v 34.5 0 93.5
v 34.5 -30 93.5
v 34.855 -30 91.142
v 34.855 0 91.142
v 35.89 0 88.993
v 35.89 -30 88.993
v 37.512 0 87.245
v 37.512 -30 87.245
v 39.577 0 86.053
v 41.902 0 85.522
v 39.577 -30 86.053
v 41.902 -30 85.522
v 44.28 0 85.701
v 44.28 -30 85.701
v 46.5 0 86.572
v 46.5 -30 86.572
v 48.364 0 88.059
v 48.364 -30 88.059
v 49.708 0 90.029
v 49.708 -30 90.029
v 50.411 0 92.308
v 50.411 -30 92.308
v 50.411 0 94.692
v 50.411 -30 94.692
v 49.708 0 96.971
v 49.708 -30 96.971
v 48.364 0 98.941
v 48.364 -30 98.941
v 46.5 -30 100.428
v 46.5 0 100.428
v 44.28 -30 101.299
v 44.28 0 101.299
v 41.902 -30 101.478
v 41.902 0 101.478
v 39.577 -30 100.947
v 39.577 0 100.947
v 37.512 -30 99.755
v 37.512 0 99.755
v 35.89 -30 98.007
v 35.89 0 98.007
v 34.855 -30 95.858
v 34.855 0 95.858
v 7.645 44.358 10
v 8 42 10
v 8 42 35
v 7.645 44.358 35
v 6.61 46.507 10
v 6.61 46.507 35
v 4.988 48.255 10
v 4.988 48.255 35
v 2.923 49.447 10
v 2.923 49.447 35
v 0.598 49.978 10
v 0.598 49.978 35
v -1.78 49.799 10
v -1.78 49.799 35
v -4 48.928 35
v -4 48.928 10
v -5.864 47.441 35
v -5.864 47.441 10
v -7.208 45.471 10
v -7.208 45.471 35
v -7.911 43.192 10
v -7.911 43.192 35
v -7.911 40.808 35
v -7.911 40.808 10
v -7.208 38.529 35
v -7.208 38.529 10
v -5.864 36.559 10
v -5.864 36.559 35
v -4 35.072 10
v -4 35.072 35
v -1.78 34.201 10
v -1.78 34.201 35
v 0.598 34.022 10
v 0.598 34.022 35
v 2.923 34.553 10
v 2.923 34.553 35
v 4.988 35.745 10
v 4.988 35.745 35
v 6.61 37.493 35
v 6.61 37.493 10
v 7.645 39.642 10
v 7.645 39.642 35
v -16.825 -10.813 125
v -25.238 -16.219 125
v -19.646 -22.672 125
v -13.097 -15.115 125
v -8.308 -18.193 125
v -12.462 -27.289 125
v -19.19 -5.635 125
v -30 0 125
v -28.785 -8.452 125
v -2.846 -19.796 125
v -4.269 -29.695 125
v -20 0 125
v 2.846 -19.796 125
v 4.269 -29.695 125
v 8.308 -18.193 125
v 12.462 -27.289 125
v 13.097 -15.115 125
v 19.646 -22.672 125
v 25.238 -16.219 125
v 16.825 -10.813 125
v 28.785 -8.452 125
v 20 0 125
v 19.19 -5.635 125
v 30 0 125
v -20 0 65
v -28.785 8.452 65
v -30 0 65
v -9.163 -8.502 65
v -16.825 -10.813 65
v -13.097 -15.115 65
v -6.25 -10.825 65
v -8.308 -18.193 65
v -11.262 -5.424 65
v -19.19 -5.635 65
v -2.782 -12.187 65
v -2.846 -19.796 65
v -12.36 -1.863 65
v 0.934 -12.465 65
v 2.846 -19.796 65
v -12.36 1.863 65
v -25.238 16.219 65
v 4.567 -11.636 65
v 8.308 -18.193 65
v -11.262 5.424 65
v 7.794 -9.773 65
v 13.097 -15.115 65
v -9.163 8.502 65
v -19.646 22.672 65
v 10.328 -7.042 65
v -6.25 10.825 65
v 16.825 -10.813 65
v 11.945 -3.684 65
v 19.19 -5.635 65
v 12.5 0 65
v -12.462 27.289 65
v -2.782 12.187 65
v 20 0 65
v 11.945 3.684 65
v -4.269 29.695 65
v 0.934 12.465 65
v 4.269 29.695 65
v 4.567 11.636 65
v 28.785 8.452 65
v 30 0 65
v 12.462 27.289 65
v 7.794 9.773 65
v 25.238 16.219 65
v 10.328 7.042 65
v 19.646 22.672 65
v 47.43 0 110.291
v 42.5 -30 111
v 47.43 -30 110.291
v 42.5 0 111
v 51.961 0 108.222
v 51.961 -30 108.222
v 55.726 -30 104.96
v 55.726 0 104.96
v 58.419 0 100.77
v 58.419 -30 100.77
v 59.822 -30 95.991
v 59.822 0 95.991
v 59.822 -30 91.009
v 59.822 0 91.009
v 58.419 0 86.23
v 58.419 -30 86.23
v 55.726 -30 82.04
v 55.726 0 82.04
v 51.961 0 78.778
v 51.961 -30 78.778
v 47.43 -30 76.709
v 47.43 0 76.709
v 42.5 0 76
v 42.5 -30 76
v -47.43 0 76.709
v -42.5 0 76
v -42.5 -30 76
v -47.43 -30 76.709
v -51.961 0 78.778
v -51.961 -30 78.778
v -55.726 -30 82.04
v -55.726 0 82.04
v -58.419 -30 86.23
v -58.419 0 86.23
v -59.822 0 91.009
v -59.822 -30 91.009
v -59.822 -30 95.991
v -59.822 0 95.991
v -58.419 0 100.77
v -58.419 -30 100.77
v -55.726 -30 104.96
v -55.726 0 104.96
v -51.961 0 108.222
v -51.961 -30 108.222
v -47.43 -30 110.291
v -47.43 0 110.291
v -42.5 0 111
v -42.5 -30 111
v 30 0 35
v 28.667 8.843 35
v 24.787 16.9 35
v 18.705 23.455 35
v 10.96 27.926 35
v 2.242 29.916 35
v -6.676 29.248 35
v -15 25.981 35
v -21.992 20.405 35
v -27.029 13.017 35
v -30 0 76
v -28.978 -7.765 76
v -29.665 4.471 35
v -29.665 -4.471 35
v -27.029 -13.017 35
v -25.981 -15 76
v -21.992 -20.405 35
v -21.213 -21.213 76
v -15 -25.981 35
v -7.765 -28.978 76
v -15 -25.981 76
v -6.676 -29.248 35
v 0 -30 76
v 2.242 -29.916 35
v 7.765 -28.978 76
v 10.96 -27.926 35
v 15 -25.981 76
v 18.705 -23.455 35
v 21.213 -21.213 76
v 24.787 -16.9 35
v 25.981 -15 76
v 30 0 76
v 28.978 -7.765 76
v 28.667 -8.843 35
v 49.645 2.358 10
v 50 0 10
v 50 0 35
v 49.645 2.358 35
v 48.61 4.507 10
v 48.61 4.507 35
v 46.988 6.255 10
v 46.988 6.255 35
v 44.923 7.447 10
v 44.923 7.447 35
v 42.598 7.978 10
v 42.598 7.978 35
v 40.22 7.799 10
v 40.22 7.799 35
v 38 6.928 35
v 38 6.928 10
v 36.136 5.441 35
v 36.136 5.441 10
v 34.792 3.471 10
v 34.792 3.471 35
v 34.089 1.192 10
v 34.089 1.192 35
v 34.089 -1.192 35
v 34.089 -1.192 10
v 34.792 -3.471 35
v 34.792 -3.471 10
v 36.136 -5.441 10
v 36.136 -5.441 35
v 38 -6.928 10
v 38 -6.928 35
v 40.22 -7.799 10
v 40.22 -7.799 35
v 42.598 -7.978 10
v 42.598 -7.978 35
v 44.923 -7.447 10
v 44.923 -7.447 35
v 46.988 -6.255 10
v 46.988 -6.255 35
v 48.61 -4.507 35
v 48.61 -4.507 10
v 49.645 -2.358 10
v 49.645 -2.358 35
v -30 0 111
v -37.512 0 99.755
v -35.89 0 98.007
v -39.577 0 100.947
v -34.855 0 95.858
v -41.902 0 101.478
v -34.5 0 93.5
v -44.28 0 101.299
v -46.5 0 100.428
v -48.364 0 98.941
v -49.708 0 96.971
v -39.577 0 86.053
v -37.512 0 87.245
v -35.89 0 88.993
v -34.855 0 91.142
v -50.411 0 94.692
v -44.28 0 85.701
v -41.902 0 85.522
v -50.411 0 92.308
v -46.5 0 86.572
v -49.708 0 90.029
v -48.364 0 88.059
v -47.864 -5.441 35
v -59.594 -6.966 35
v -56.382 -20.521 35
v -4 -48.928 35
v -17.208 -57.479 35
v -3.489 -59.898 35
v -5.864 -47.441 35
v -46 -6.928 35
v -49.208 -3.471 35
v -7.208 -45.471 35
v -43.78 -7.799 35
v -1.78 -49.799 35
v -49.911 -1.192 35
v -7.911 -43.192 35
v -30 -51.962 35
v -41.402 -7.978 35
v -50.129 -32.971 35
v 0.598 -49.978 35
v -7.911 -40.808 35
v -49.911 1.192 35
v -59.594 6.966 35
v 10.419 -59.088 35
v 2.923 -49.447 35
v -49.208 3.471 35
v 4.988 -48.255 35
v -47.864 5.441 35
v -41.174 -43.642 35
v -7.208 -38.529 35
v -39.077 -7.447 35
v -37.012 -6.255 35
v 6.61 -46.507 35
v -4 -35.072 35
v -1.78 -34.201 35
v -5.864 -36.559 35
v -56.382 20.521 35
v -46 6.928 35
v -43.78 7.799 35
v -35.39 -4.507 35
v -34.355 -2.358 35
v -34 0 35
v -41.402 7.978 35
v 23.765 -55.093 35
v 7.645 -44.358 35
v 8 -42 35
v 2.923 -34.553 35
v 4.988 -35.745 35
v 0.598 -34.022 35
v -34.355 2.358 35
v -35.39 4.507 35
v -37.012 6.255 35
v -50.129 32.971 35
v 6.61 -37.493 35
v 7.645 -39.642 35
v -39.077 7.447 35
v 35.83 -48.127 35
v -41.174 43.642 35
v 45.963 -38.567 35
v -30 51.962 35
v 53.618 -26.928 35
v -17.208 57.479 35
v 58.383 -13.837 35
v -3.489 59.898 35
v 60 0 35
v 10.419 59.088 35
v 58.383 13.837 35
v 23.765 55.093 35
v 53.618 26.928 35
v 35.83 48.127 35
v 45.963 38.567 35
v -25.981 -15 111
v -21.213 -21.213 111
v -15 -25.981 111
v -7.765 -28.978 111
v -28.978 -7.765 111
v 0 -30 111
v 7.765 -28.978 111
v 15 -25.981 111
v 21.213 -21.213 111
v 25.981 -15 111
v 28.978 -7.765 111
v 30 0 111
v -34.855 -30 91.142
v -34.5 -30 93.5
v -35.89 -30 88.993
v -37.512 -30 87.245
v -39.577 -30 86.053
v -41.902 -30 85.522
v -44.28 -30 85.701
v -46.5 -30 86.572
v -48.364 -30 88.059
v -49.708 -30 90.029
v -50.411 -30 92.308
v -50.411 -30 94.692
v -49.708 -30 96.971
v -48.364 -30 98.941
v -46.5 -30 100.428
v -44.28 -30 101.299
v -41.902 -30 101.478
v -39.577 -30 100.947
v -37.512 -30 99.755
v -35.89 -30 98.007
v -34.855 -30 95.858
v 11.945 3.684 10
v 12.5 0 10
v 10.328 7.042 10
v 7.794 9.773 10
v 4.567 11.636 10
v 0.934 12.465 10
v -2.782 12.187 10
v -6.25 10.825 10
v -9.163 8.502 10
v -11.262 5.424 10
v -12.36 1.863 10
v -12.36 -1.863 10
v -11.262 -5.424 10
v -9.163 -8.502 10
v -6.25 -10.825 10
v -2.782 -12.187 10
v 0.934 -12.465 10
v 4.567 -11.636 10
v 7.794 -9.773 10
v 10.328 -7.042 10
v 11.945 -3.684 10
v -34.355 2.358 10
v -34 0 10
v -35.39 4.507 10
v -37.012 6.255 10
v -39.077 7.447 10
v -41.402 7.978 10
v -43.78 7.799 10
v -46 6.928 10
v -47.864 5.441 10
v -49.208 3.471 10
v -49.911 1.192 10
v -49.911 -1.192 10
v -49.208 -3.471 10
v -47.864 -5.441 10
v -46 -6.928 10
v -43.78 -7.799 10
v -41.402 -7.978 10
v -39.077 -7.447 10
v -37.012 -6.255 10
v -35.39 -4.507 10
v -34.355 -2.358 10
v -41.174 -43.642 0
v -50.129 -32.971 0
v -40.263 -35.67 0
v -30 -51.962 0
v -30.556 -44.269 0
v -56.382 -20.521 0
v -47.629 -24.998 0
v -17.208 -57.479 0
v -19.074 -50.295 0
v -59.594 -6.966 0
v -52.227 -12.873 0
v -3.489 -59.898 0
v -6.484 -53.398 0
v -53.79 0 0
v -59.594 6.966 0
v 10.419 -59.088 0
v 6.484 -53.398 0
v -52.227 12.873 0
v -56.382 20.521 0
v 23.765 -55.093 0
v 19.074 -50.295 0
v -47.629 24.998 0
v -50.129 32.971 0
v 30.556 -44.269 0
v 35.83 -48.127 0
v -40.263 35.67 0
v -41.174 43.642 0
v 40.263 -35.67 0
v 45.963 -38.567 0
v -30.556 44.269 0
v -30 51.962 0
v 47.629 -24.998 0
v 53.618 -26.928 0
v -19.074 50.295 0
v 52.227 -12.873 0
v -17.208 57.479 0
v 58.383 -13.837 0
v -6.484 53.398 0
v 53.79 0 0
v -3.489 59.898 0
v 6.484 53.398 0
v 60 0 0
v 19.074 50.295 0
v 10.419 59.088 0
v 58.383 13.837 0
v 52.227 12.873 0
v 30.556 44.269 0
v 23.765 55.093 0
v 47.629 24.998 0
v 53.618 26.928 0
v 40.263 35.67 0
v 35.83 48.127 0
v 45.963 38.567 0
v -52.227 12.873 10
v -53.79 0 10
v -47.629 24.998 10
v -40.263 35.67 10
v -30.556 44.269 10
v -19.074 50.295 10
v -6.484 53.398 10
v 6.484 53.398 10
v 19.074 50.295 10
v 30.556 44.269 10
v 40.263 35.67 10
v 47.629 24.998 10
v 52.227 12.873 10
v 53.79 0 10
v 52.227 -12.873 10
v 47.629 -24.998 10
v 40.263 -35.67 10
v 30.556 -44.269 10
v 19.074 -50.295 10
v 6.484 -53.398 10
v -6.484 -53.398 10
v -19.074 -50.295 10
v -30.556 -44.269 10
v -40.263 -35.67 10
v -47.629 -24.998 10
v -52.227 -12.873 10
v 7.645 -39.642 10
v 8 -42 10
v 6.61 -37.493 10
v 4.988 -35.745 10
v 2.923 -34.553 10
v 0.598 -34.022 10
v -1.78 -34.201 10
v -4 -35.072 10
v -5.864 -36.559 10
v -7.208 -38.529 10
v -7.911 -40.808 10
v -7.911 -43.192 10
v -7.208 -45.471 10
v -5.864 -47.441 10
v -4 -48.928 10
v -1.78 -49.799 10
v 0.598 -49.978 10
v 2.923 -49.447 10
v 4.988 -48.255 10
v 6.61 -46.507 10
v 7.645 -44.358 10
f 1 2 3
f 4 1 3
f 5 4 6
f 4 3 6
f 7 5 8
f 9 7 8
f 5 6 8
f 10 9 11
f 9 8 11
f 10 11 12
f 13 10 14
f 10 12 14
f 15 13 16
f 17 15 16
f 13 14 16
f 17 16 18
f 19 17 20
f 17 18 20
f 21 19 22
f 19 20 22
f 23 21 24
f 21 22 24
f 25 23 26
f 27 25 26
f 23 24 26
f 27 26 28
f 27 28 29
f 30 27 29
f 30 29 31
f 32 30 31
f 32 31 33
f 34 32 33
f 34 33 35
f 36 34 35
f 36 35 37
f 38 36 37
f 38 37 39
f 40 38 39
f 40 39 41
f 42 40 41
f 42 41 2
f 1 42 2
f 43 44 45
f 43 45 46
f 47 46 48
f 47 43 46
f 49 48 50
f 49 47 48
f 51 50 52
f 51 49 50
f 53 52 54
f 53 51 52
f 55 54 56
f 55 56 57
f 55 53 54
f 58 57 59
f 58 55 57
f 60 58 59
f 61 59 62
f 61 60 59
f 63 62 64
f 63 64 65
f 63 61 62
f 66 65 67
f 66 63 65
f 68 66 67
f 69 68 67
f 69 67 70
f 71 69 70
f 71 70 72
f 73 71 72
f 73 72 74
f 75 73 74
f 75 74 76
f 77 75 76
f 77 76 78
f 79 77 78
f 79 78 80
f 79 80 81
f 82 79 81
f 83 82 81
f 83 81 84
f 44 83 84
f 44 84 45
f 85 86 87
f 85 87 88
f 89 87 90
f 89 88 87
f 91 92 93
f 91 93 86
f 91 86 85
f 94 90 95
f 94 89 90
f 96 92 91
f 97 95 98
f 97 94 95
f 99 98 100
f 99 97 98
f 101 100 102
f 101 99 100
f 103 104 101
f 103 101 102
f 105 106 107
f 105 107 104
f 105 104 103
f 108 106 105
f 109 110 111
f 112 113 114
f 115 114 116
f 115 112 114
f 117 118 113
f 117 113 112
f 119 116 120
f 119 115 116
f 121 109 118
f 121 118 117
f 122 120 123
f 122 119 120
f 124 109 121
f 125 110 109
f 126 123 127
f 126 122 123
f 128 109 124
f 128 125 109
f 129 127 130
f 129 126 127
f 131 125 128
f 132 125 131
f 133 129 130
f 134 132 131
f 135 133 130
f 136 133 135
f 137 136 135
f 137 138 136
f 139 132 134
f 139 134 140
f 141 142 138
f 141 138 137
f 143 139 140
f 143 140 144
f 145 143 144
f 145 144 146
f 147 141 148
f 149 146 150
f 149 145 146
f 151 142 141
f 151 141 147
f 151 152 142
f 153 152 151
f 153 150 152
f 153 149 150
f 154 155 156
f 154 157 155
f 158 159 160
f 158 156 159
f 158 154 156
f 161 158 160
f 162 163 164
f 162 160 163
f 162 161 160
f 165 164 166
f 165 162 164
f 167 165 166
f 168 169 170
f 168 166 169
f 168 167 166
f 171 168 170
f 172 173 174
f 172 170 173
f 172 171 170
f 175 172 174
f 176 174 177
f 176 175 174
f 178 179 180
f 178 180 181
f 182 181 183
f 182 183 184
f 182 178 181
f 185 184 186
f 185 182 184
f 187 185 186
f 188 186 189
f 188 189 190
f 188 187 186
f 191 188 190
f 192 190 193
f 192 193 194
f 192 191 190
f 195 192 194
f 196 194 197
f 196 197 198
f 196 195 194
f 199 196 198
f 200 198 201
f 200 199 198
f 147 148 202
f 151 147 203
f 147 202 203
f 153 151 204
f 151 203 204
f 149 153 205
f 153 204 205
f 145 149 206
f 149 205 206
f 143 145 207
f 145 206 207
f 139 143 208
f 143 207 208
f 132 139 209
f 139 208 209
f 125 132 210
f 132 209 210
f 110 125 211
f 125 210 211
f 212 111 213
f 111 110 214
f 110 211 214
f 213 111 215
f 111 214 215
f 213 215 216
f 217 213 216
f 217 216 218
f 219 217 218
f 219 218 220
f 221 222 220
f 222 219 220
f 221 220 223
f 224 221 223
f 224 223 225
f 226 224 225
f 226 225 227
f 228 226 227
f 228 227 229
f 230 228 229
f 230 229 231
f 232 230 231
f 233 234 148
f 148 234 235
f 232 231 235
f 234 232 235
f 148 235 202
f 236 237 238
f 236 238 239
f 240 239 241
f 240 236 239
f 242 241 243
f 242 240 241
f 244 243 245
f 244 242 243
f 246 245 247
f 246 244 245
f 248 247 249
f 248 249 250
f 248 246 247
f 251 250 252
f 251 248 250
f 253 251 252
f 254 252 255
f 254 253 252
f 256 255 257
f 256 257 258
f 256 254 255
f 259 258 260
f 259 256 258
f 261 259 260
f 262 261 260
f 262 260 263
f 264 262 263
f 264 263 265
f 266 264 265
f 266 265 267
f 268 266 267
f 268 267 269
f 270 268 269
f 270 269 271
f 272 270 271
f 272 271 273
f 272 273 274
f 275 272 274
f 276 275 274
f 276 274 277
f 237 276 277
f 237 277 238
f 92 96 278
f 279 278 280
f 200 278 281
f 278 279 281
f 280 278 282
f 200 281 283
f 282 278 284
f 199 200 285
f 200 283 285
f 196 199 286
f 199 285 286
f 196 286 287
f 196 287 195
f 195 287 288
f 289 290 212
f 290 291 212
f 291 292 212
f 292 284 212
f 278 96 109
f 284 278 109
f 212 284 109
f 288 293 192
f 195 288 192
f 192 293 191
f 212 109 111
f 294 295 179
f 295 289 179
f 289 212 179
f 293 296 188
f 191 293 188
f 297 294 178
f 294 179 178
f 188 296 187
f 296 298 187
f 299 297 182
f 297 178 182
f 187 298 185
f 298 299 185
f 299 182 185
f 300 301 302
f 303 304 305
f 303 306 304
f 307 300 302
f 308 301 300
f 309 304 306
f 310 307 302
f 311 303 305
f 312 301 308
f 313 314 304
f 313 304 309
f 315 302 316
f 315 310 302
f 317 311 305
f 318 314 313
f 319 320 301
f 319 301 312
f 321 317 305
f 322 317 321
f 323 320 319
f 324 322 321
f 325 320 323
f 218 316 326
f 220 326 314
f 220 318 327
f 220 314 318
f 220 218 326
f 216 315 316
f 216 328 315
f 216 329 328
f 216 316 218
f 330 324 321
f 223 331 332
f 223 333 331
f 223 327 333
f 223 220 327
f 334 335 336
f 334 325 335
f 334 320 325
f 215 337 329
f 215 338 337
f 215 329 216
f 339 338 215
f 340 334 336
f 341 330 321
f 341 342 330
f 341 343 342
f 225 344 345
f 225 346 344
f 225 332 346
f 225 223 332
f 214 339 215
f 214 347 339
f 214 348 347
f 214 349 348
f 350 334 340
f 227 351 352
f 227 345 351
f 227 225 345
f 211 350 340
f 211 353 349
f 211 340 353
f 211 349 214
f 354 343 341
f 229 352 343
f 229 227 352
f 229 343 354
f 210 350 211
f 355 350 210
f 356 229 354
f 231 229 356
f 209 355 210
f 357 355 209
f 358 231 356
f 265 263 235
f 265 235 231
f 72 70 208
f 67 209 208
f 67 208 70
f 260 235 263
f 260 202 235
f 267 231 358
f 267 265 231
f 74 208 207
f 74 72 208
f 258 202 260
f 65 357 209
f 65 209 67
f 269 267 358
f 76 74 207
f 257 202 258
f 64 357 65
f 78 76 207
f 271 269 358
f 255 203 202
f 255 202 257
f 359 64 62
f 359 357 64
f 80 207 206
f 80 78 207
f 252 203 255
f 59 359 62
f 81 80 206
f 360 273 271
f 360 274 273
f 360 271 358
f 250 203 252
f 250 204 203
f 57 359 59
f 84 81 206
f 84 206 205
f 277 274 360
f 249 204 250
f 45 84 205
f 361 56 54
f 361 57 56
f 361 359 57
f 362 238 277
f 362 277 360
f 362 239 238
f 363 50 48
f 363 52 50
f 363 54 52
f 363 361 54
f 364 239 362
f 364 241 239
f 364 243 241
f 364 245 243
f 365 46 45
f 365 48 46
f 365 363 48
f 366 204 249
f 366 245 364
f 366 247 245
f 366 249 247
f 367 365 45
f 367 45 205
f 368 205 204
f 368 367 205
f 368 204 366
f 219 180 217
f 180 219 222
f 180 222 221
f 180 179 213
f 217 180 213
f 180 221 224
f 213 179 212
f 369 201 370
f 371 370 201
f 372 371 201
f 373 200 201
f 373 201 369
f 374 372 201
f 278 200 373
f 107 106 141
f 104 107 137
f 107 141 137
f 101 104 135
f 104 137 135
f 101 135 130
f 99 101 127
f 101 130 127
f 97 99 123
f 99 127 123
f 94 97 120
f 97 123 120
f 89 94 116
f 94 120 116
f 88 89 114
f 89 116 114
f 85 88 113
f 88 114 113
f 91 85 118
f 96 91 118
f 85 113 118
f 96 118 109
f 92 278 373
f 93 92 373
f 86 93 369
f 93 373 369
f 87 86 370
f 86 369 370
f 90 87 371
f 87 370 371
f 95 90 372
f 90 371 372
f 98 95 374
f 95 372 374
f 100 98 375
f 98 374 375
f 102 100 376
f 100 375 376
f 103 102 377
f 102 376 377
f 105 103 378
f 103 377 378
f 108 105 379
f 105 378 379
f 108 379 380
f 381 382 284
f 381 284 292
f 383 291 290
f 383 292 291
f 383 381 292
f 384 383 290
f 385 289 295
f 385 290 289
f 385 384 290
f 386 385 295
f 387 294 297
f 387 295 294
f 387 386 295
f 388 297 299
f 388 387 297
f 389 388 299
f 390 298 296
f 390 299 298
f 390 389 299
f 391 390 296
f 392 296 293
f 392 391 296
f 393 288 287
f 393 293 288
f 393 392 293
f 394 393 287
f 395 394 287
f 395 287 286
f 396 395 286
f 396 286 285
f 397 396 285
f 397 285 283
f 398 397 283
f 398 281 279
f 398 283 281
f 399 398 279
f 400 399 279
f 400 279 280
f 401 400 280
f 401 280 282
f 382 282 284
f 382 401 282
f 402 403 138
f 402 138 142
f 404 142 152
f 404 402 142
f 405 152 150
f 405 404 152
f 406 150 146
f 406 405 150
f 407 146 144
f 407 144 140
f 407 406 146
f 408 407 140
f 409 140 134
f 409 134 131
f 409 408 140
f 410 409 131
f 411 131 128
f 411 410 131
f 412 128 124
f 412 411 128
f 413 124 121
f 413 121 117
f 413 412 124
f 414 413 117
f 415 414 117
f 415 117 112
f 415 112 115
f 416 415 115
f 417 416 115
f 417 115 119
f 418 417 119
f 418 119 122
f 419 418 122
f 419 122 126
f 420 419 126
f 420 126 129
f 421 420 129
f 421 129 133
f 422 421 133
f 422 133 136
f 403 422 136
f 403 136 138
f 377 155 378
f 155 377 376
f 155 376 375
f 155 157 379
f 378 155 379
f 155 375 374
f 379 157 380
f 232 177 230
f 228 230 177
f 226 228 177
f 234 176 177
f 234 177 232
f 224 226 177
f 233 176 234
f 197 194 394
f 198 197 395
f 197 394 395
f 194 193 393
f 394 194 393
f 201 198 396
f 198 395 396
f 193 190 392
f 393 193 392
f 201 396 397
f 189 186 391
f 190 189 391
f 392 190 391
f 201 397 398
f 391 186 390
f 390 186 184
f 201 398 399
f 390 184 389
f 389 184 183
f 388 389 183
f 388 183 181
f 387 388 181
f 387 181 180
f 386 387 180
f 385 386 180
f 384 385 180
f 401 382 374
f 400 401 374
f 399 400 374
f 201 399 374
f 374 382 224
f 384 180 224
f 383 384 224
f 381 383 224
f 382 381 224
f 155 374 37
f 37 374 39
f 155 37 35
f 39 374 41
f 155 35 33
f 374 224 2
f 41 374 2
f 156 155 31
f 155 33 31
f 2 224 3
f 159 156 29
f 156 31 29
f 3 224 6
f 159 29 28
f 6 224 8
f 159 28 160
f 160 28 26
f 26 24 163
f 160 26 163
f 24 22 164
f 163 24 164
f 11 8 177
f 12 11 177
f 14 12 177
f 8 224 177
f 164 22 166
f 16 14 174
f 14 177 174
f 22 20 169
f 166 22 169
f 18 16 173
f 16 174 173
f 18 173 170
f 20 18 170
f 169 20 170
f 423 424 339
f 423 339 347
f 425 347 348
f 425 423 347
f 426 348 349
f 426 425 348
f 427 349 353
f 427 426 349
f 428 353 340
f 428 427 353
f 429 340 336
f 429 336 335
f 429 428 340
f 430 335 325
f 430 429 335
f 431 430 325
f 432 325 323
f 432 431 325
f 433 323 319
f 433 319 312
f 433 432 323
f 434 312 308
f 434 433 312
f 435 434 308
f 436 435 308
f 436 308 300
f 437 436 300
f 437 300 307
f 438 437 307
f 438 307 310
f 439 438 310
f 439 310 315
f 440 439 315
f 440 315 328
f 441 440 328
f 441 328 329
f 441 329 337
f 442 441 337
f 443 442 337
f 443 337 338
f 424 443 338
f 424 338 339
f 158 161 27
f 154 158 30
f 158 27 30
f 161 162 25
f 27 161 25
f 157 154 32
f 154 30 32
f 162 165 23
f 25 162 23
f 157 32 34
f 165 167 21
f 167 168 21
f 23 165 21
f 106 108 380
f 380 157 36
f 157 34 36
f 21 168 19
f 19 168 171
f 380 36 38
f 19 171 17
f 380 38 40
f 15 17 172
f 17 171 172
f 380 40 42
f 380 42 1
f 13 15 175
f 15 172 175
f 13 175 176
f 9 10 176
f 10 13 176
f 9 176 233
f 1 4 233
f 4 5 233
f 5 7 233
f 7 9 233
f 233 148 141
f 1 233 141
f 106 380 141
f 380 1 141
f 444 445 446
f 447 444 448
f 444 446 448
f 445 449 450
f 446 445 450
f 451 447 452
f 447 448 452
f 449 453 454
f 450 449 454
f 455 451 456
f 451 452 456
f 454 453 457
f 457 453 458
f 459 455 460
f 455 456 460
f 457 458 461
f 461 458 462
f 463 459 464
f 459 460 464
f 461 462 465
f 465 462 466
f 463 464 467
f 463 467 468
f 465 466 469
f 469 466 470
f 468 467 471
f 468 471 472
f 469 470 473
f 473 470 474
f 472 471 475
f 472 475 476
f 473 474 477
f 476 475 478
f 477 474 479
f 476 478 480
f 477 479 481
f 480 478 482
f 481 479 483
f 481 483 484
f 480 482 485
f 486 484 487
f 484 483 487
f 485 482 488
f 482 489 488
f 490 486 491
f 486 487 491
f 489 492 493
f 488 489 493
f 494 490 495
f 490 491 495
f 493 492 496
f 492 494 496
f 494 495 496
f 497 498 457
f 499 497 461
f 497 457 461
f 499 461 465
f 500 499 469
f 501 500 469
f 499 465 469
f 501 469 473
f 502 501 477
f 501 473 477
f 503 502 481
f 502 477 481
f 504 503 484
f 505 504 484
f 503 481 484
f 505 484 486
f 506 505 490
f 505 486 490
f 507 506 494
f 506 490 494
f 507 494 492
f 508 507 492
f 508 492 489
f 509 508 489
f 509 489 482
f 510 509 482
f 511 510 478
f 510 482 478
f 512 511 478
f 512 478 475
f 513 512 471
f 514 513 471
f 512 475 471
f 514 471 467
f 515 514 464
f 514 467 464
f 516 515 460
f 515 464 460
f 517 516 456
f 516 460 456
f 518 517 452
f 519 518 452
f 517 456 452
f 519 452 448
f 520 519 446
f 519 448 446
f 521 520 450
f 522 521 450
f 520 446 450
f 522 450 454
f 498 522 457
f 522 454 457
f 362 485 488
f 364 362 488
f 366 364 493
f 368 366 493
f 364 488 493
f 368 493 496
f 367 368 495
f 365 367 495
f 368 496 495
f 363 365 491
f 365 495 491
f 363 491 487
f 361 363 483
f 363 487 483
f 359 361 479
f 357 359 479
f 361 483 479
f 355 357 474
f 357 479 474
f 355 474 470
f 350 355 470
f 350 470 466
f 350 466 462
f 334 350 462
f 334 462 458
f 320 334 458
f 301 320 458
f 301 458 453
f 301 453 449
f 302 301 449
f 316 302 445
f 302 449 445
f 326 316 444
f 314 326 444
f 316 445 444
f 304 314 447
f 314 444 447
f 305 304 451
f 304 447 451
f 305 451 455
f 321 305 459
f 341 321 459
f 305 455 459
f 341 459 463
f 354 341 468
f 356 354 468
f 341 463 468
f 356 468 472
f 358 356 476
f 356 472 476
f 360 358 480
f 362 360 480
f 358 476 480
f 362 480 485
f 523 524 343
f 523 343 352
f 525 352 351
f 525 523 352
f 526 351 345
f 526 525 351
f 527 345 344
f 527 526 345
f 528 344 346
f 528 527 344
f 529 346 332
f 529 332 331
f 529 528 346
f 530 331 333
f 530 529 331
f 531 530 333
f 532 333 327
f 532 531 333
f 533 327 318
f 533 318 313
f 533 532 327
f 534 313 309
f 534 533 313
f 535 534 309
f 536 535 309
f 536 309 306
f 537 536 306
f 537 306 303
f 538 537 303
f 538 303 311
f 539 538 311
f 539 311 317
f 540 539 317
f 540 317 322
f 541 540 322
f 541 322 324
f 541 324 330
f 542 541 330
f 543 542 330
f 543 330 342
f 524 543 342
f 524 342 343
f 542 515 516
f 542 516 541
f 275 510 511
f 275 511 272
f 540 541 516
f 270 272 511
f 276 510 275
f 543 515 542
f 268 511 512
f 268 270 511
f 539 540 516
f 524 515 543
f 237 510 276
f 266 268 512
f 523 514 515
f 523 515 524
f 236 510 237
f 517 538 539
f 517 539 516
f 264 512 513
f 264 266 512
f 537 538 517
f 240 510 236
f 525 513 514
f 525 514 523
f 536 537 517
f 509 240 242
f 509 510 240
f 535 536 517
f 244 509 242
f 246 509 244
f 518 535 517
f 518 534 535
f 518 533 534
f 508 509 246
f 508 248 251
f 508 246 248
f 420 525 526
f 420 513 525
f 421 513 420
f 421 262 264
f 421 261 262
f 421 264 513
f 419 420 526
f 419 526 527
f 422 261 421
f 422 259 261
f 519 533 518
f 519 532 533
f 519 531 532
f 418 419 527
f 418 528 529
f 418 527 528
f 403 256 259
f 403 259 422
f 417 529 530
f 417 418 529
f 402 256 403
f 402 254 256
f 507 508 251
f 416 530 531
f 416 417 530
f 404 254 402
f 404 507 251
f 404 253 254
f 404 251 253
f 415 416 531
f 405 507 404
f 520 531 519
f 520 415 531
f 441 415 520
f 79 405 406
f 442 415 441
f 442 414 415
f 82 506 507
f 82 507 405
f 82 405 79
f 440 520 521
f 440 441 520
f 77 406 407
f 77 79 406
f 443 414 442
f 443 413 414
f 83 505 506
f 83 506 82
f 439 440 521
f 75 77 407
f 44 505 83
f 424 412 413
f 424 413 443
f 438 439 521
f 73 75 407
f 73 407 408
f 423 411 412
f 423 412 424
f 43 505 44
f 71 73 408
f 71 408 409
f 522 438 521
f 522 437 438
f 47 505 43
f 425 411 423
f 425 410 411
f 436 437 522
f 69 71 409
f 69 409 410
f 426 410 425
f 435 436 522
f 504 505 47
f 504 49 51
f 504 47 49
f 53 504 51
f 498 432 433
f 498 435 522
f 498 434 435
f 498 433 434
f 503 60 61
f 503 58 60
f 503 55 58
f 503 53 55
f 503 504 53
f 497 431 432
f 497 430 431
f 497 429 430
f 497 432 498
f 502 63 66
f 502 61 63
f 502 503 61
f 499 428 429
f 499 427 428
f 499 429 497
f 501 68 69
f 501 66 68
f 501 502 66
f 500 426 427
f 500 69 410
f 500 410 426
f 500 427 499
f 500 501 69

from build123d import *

# Parameters (mm, degrees)
BOSS_EXTRUDE1_DEPTH         = 125
SKETCH1_4_R                 = 12.5
BOSS_EXTRUDE2_DEPTH         = 65
SKETCH1_5_R                 = 60
SKETCH1_5_R_2               = 8
SKETCH1_5_R_3               = 30
BOSS_EXTRUDE3_DEPTH         = 35
BOSS_EXTRUDE4_START         = -49
BOSS_EXTRUDE4_DEPTH         = 35
FILLET1_RADIUS              = 17.5
FILLET1_LENGTH              = 30
F_16_0_16_DIAMETER_HOLE1_D  = 16
FILLET1_OF_MIRROR1_2_RADIUS = 17.5
FILLET1_OF_MIRROR1_2_LENGTH = 30
SKETCH5_R                   = 53.79037733
CUT_EXTRUDE2_DEPTH          = 10


with BuildPart() as part:
    # Sketch1 → Boss-Extrude1 (new body)
    with BuildSketch(Plane.XY):
        with BuildLine():
            Line((30, 0), (20, 0))
            ThreePointArc((20, 0), (0, -20), (-20, 0))
            Line((-20, 0), (-30, 0))
            ThreePointArc((-30, 0), (0, -30), (30, 0))
        make_face()
    extrude(amount=BOSS_EXTRUDE1_DEPTH)

    # Sketch1<4> → Boss-Extrude2 (add)
    with BuildSketch(Plane.XY):
        with BuildLine():
            ThreePointArc((-20, 0), (0, -20), (20, 0))
            Line((20, 0), (30, 0))
            ThreePointArc((30, 0), (0, 30), (-30, 0))
            Line((-30, 0), (-20, 0))
        make_face()
        Circle(SKETCH1_4_R, mode=Mode.SUBTRACT)
    extrude(amount=BOSS_EXTRUDE2_DEPTH)

    # Sketch1<5> → Boss-Extrude3 (add)
    with BuildSketch(Plane.XY):
        Circle(SKETCH1_5_R)
        with Locations((0, 42)):
            Circle(SKETCH1_5_R_2, mode=Mode.SUBTRACT)
        with Locations((-42, 0)):
            Circle(SKETCH1_5_R_2, mode=Mode.SUBTRACT)
        with Locations((0, -42)):
            Circle(SKETCH1_5_R_2, mode=Mode.SUBTRACT)
        with Locations((42, 0)):
            Circle(SKETCH1_5_R_2, mode=Mode.SUBTRACT)
        Circle(SKETCH1_5_R_3, mode=Mode.SUBTRACT)
    extrude(amount=BOSS_EXTRUDE3_DEPTH)

    # Sketch2 → Boss-Extrude4 (add)
    with BuildSketch(Plane.XY.offset(125).offset(BOSS_EXTRUDE4_START)):
        with BuildLine():
            Line((30, 0), (60, 0))
            Line((60, 0), (60, -26.364821455))
            Line((60, -26.364821455), (60, -30))
            Line((60, -30), (0, -30))
            ThreePointArc((0, -30), (21.213203436, -21.213203436), (30, 0))
        make_face()
    boss_extrude4 = extrude(amount=BOSS_EXTRUDE4_DEPTH)

    # Fillet1: full round fillet: the end face becomes a half cylinder, R = half its width
    fillet1_face = Plane((60, -15, 93.5), x_dir=(0, 1, 0), z_dir=(1, 0, 0))  # on the end face: x along it, z out of the body
    fillet1_slab = fillet1_face.offset(-FILLET1_RADIUS / 2) * Box(FILLET1_LENGTH, 2 * FILLET1_RADIUS, FILLET1_RADIUS, mode=Mode.PRIVATE)  # the body's end, R deep
    fillet1_round = Plane((42.5, -15, 93.5), x_dir=(1, 0, 0), z_dir=(0, 1, 0)) * Cylinder(FILLET1_RADIUS, FILLET1_LENGTH, mode=Mode.PRIVATE)  # its axis R under the face
    add(fillet1_slab - fillet1_round, mode=Mode.SUBTRACT)

    # Ø16.0 (16) Diameter Hole1 (through all)
    with Locations(Plane(origin=(42.5, 0, 93.5), x_dir=(1, 0, 0), z_dir=(0, 1, 0))):
        with Locations((0, 0)):
            f_16_0_16_diameter_hole1 = Hole(F_16_0_16_DIAMETER_HOLE1_D / 2)

    # Mirror1: Boss-Extrude4, Ø16.0 (16) Diameter Hole1 across plane
    add(boss_extrude4.mirror(Plane(origin=(0, 0, 0), x_dir=(0, 0, 1), z_dir=(1, 0, 0))))
    add(f_16_0_16_diameter_hole1.mirror(Plane(origin=(0, 0, 0), x_dir=(0, 0, 1), z_dir=(1, 0, 0))), mode=Mode.SUBTRACT)

    # Fillet1 of Mirror1 2: full round fillet: the end face becomes a half cylinder, R = half its width
    fillet1_of_mirror1_2_face = Plane((-60, -15, 93.5), x_dir=(0, 1, 0), z_dir=(-1, 0, 0))  # on the end face: x along it, z out of the body
    fillet1_of_mirror1_2_slab = fillet1_of_mirror1_2_face.offset(-FILLET1_OF_MIRROR1_2_RADIUS / 2) * Box(FILLET1_OF_MIRROR1_2_LENGTH, 2 * FILLET1_OF_MIRROR1_2_RADIUS, FILLET1_OF_MIRROR1_2_RADIUS, mode=Mode.PRIVATE)  # the body's end, R deep
    fillet1_of_mirror1_2_round = Plane((-42.5, -15, 93.5), x_dir=(-1, 0, 0), z_dir=(0, 1, 0)) * Cylinder(FILLET1_OF_MIRROR1_2_RADIUS, FILLET1_OF_MIRROR1_2_LENGTH, mode=Mode.PRIVATE)  # its axis R under the face
    add(fillet1_of_mirror1_2_slab - fillet1_of_mirror1_2_round, mode=Mode.SUBTRACT)

    # Sketch5 → Cut-Extrude2 (cut)
    with BuildSketch(Plane(origin=(0, 0, 0), x_dir=(-1, 0, 0), z_dir=(0, 0, -1))):
        Circle(SKETCH5_R)
    extrude(amount=-CUT_EXTRUDE2_DEPTH, mode=Mode.SUBTRACT)


solid = part.part
